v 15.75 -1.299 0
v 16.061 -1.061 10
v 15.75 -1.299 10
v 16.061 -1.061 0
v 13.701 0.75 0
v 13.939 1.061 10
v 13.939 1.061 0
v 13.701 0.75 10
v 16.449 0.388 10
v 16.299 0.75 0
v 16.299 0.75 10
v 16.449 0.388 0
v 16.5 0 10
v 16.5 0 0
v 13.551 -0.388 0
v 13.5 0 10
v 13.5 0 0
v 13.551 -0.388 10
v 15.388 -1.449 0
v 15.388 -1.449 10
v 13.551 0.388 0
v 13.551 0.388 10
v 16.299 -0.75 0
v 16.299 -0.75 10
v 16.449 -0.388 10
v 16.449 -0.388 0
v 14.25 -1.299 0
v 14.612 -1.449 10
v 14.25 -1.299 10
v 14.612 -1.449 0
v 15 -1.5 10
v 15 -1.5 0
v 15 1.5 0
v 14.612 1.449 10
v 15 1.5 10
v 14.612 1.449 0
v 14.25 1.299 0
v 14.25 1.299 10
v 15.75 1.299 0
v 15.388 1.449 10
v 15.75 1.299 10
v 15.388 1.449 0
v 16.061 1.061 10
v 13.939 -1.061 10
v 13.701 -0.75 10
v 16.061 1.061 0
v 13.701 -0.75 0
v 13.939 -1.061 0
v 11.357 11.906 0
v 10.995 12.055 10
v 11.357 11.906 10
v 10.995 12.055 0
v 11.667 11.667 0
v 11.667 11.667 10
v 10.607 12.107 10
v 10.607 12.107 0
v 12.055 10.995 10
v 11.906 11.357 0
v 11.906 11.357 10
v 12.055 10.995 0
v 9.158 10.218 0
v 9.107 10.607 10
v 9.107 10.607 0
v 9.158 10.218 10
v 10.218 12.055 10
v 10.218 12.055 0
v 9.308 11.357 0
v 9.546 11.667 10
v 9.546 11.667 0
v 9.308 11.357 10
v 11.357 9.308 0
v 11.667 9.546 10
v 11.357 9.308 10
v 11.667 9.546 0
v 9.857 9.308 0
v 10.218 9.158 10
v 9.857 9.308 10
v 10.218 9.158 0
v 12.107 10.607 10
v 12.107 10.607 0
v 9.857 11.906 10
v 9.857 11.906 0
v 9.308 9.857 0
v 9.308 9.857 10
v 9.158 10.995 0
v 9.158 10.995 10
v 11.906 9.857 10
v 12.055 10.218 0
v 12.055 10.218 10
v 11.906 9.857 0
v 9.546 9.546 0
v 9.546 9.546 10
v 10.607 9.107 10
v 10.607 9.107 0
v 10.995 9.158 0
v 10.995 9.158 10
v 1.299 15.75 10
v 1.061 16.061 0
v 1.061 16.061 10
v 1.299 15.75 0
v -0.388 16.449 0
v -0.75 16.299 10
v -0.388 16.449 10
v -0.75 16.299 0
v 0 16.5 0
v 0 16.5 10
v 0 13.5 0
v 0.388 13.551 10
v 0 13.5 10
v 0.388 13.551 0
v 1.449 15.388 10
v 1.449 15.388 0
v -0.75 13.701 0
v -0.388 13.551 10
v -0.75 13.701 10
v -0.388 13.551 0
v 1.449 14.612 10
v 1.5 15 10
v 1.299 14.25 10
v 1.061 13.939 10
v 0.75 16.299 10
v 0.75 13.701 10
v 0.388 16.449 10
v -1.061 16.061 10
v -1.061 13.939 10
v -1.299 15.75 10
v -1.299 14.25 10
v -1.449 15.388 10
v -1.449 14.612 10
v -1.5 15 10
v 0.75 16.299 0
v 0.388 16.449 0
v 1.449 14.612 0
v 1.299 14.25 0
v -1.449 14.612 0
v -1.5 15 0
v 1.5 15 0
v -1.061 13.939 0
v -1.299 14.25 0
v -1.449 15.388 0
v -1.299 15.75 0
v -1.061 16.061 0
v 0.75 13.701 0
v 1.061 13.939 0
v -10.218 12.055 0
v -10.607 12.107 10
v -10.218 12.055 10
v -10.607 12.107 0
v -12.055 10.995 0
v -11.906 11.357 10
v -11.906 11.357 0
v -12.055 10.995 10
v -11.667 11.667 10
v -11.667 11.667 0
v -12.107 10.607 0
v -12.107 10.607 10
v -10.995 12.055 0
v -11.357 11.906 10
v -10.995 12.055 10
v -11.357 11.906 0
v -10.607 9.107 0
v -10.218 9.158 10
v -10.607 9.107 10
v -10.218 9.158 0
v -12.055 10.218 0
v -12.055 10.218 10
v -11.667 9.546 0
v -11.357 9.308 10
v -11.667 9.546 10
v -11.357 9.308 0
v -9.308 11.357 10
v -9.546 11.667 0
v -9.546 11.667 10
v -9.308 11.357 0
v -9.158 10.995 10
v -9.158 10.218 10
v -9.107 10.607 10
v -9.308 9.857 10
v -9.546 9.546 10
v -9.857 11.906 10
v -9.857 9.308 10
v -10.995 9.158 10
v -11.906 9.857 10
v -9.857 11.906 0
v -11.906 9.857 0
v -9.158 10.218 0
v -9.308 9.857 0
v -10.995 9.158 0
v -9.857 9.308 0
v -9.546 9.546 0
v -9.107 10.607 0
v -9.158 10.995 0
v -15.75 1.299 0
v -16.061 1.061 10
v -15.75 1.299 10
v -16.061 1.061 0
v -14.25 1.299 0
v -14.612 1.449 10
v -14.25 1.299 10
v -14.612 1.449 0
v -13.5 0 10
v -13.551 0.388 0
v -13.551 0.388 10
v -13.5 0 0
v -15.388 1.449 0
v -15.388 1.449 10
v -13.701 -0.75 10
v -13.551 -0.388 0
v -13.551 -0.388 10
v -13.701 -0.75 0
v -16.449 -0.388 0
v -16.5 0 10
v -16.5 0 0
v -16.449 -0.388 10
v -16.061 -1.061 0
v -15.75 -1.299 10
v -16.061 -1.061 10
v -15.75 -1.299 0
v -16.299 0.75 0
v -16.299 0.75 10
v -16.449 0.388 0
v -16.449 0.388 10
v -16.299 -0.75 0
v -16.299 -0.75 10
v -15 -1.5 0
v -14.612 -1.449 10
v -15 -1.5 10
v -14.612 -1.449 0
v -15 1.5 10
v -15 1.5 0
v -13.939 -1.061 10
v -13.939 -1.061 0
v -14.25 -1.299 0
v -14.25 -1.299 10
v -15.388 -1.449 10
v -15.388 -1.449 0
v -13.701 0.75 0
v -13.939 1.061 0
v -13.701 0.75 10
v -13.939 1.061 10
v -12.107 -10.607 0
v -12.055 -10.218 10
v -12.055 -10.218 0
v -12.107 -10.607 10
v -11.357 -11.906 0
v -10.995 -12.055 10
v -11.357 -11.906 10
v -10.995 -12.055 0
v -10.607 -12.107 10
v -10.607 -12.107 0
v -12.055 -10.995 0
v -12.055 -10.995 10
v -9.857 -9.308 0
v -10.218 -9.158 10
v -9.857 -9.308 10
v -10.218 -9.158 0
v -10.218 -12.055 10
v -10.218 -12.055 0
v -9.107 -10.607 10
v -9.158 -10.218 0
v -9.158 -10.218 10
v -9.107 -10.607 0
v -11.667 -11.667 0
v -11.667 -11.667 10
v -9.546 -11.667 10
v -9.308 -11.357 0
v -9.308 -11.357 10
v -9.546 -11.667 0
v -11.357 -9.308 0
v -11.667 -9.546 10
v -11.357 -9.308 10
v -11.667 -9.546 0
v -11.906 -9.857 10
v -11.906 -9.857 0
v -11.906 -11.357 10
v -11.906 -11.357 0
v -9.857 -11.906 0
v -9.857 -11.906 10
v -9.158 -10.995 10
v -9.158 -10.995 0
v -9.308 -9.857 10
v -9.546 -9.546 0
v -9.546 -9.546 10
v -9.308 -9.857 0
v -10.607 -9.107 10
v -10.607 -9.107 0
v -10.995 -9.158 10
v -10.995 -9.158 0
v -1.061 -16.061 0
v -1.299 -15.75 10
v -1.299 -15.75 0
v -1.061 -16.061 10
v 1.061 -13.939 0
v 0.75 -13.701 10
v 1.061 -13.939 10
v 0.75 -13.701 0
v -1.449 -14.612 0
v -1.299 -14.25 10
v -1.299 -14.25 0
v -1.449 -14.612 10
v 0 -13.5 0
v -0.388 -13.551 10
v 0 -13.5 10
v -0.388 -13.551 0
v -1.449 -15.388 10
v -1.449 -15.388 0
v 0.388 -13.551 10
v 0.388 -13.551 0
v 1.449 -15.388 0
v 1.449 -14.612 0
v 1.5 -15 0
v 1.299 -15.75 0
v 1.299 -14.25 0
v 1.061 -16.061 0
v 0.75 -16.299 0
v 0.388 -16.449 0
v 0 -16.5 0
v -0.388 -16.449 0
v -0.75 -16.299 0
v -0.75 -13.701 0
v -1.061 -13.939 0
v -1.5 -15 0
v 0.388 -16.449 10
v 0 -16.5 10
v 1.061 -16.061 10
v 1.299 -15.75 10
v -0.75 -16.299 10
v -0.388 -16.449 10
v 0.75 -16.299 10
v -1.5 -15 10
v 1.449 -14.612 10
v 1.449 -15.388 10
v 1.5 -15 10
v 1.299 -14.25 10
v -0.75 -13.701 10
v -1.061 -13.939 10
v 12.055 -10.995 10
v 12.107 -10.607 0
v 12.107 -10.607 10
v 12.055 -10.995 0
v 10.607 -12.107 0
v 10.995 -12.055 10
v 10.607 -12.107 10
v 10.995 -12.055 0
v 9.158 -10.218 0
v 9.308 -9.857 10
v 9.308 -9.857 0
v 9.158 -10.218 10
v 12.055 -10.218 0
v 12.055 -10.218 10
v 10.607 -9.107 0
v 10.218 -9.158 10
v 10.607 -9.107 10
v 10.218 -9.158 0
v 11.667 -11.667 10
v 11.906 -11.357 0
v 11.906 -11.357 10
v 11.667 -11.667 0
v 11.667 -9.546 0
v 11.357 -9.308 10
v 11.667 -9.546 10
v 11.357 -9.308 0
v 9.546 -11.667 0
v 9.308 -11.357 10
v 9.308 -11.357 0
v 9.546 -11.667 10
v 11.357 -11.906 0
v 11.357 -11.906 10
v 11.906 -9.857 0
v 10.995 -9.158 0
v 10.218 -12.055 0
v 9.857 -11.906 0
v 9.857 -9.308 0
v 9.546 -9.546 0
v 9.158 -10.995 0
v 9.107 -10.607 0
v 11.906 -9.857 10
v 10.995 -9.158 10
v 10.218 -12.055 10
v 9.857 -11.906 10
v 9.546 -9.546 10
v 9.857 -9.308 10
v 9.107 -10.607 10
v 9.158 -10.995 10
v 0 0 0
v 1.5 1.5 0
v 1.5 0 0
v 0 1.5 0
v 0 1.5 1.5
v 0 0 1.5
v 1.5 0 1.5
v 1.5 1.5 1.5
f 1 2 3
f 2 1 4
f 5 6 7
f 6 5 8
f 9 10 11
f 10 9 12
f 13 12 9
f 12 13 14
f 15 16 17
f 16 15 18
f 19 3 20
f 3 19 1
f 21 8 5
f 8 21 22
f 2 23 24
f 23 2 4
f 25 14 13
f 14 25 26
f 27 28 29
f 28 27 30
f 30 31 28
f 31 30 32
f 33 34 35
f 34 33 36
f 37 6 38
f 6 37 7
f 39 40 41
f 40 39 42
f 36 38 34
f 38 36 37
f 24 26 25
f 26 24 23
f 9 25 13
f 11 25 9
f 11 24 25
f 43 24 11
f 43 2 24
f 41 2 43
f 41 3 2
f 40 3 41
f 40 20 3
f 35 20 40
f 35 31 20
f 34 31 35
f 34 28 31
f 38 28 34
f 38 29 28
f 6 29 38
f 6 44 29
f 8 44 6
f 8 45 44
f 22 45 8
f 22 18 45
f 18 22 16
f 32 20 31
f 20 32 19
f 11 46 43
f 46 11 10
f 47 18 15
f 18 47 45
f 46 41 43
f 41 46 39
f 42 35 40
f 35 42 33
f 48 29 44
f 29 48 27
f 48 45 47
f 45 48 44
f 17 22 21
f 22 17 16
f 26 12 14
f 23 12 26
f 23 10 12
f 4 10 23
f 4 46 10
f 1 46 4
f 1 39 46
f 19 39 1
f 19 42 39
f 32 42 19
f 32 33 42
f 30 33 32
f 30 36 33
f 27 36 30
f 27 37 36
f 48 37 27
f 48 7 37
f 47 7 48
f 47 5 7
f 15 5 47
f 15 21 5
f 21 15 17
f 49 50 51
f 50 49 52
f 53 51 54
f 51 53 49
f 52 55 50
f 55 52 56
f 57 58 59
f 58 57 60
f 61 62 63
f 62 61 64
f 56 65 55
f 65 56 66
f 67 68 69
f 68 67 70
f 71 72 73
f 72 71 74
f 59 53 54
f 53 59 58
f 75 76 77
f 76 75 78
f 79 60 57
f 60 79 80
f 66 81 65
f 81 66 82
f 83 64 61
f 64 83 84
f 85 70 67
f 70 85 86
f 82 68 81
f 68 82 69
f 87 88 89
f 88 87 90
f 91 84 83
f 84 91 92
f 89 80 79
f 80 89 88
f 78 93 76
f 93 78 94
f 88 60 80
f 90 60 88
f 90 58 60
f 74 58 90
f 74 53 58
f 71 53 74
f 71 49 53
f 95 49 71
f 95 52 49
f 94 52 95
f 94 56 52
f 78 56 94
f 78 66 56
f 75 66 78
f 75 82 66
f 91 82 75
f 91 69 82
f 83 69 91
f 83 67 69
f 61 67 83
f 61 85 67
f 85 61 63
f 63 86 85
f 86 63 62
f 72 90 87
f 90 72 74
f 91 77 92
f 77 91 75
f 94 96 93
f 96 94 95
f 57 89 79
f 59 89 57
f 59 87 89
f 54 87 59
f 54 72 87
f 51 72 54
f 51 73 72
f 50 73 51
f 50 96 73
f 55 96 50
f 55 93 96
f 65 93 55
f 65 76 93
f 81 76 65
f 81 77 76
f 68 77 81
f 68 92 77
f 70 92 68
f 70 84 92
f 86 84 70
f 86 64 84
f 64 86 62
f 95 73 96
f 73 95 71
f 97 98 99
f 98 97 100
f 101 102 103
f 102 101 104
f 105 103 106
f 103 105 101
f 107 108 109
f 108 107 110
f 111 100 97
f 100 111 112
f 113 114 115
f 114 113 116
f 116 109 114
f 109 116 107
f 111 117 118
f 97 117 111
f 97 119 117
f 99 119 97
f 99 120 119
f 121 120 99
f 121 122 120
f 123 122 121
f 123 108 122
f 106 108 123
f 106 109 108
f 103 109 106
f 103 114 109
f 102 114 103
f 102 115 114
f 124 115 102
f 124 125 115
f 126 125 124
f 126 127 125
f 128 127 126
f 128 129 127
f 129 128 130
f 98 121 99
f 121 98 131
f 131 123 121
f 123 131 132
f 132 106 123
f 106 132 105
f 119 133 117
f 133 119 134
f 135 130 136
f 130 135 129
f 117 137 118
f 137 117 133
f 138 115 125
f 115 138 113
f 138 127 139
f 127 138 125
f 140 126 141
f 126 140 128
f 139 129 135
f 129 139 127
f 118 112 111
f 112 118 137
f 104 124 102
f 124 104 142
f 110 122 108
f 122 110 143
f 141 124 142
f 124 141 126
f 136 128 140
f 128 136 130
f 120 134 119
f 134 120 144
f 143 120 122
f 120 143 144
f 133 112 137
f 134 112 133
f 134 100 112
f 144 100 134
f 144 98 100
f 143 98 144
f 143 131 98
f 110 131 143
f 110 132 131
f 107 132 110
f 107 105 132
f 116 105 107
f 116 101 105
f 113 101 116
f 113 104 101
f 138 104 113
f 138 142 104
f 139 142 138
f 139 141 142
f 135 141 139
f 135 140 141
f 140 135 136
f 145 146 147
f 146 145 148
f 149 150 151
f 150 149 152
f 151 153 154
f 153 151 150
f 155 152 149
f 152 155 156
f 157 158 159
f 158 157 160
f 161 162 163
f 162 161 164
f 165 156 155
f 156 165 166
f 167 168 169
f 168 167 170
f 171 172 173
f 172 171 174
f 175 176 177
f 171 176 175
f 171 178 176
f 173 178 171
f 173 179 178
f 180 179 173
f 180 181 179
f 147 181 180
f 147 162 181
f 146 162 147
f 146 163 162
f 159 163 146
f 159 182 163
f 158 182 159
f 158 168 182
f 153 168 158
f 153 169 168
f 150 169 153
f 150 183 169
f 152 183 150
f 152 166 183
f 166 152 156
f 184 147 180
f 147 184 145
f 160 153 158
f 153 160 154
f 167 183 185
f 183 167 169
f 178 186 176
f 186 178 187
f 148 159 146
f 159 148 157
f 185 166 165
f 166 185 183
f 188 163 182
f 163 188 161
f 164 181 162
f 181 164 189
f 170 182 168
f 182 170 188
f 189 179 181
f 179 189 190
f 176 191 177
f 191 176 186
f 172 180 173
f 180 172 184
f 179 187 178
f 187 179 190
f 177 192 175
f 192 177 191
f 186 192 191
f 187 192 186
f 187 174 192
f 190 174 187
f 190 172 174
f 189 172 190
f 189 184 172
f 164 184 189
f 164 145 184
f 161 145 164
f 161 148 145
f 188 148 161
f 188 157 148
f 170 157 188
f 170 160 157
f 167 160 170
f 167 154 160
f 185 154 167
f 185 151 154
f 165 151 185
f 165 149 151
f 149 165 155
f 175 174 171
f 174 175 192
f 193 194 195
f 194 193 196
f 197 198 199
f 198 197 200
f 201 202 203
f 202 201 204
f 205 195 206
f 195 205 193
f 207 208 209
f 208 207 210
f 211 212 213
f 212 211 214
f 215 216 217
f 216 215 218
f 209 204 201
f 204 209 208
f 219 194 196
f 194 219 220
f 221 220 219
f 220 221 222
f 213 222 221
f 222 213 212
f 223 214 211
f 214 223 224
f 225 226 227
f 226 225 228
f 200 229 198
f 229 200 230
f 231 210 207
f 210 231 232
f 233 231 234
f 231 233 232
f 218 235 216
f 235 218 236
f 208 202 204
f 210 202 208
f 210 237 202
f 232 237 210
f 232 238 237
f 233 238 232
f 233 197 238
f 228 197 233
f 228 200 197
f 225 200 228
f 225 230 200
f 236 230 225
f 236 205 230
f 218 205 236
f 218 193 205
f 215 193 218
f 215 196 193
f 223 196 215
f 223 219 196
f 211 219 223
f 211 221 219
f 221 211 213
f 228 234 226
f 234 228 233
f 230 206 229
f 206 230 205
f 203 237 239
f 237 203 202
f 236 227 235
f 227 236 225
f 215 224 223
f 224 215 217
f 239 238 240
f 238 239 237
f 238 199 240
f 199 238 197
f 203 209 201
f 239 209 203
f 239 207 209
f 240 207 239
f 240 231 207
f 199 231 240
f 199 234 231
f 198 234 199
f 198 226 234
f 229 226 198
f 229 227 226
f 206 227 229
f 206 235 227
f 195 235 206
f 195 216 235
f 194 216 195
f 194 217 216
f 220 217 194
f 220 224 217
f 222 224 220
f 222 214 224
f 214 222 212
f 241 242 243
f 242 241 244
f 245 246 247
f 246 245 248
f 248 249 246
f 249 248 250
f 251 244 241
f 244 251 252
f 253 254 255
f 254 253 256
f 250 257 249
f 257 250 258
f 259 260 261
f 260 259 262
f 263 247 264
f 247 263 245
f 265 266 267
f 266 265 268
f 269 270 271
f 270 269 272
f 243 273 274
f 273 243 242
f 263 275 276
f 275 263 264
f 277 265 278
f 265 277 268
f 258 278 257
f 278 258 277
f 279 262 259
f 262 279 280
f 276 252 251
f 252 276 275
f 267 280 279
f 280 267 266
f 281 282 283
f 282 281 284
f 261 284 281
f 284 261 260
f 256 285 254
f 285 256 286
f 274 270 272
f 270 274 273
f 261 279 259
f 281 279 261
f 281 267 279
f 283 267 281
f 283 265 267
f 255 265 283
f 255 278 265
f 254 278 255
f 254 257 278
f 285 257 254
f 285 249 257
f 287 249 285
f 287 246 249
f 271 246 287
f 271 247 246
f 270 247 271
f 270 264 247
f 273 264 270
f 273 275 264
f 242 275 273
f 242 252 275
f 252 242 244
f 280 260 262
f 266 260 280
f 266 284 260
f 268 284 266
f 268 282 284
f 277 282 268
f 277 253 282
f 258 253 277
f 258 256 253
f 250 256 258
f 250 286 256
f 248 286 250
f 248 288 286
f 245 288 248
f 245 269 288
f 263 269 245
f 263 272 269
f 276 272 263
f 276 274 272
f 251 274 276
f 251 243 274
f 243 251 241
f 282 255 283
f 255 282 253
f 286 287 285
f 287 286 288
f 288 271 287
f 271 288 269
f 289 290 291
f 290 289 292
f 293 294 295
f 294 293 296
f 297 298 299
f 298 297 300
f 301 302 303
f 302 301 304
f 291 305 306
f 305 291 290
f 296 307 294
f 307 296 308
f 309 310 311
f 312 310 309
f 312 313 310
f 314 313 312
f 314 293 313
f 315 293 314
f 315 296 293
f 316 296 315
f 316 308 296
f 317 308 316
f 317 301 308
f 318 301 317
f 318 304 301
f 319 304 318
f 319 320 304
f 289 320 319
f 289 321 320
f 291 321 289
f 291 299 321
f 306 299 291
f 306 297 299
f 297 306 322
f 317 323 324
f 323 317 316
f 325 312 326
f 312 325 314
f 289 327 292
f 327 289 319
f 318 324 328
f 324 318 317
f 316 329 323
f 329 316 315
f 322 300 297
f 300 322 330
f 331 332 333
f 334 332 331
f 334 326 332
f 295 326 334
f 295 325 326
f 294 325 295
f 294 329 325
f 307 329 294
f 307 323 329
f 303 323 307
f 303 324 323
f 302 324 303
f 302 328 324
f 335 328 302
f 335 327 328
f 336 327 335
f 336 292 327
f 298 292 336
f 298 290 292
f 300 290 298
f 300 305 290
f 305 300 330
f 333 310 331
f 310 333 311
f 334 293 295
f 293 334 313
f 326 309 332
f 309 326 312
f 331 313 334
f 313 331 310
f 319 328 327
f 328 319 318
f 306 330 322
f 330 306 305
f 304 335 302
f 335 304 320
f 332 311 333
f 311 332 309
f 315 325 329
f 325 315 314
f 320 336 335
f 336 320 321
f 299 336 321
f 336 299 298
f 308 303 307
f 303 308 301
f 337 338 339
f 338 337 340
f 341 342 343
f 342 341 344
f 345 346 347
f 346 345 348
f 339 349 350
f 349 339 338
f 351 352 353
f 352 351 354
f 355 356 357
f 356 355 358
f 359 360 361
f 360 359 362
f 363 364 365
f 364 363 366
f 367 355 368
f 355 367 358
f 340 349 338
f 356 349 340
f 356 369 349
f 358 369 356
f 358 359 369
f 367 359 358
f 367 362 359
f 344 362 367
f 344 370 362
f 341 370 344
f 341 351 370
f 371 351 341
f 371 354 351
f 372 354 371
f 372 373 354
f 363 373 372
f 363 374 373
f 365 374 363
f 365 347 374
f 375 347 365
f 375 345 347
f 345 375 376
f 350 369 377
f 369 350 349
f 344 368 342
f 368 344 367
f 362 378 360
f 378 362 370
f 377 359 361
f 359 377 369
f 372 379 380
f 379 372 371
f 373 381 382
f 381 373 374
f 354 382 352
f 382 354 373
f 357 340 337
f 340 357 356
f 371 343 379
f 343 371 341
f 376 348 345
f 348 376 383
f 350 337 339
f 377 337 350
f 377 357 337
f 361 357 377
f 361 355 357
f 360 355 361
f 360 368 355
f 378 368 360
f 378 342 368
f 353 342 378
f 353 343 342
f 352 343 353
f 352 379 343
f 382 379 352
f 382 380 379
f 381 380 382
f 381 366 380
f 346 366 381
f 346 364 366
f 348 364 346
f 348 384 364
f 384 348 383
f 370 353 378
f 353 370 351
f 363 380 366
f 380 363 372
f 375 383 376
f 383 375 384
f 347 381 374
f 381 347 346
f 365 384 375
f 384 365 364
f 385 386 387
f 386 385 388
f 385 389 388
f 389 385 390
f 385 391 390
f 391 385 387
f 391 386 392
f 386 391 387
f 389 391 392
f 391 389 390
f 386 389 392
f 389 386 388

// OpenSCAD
// Original CanvasNet test fixture: module and function definitions.
function area(w, h = 1) = w * h;
function clamp01(v) = v < 0 ? 0 : (v > 1 ? 1 : v);
function total(list, i = 0) = i >= len(list) ? 0 : list[i] + total(list, i + 1);
function scaled(v, k) = let(n = len(v)) [for (i = [0 : n - 1]) v[i] * k];

module peg(radius = 2, height = 10, $fn = 24) {
  cylinder(r = radius, h = height);
}

module ring_of(count = 6, radius = 20) {
  for (i = [0 : count - 1])
    rotate([0, 0, i * 360 / count])
      translate([radius, 0, 0])
        children();
}

module nested_demo(depth = 3) {
  module leaf(s) { cube(s); }
  function half(v) = v / 2;
  if (depth > 0) {
    leaf(half(depth));
    nested_demo(depth - 1);
  }
}

module wrapper() children(0);

module nothing();

ring_of(count = 8, radius = 15) peg(radius = 1.5);
nested_demo();
